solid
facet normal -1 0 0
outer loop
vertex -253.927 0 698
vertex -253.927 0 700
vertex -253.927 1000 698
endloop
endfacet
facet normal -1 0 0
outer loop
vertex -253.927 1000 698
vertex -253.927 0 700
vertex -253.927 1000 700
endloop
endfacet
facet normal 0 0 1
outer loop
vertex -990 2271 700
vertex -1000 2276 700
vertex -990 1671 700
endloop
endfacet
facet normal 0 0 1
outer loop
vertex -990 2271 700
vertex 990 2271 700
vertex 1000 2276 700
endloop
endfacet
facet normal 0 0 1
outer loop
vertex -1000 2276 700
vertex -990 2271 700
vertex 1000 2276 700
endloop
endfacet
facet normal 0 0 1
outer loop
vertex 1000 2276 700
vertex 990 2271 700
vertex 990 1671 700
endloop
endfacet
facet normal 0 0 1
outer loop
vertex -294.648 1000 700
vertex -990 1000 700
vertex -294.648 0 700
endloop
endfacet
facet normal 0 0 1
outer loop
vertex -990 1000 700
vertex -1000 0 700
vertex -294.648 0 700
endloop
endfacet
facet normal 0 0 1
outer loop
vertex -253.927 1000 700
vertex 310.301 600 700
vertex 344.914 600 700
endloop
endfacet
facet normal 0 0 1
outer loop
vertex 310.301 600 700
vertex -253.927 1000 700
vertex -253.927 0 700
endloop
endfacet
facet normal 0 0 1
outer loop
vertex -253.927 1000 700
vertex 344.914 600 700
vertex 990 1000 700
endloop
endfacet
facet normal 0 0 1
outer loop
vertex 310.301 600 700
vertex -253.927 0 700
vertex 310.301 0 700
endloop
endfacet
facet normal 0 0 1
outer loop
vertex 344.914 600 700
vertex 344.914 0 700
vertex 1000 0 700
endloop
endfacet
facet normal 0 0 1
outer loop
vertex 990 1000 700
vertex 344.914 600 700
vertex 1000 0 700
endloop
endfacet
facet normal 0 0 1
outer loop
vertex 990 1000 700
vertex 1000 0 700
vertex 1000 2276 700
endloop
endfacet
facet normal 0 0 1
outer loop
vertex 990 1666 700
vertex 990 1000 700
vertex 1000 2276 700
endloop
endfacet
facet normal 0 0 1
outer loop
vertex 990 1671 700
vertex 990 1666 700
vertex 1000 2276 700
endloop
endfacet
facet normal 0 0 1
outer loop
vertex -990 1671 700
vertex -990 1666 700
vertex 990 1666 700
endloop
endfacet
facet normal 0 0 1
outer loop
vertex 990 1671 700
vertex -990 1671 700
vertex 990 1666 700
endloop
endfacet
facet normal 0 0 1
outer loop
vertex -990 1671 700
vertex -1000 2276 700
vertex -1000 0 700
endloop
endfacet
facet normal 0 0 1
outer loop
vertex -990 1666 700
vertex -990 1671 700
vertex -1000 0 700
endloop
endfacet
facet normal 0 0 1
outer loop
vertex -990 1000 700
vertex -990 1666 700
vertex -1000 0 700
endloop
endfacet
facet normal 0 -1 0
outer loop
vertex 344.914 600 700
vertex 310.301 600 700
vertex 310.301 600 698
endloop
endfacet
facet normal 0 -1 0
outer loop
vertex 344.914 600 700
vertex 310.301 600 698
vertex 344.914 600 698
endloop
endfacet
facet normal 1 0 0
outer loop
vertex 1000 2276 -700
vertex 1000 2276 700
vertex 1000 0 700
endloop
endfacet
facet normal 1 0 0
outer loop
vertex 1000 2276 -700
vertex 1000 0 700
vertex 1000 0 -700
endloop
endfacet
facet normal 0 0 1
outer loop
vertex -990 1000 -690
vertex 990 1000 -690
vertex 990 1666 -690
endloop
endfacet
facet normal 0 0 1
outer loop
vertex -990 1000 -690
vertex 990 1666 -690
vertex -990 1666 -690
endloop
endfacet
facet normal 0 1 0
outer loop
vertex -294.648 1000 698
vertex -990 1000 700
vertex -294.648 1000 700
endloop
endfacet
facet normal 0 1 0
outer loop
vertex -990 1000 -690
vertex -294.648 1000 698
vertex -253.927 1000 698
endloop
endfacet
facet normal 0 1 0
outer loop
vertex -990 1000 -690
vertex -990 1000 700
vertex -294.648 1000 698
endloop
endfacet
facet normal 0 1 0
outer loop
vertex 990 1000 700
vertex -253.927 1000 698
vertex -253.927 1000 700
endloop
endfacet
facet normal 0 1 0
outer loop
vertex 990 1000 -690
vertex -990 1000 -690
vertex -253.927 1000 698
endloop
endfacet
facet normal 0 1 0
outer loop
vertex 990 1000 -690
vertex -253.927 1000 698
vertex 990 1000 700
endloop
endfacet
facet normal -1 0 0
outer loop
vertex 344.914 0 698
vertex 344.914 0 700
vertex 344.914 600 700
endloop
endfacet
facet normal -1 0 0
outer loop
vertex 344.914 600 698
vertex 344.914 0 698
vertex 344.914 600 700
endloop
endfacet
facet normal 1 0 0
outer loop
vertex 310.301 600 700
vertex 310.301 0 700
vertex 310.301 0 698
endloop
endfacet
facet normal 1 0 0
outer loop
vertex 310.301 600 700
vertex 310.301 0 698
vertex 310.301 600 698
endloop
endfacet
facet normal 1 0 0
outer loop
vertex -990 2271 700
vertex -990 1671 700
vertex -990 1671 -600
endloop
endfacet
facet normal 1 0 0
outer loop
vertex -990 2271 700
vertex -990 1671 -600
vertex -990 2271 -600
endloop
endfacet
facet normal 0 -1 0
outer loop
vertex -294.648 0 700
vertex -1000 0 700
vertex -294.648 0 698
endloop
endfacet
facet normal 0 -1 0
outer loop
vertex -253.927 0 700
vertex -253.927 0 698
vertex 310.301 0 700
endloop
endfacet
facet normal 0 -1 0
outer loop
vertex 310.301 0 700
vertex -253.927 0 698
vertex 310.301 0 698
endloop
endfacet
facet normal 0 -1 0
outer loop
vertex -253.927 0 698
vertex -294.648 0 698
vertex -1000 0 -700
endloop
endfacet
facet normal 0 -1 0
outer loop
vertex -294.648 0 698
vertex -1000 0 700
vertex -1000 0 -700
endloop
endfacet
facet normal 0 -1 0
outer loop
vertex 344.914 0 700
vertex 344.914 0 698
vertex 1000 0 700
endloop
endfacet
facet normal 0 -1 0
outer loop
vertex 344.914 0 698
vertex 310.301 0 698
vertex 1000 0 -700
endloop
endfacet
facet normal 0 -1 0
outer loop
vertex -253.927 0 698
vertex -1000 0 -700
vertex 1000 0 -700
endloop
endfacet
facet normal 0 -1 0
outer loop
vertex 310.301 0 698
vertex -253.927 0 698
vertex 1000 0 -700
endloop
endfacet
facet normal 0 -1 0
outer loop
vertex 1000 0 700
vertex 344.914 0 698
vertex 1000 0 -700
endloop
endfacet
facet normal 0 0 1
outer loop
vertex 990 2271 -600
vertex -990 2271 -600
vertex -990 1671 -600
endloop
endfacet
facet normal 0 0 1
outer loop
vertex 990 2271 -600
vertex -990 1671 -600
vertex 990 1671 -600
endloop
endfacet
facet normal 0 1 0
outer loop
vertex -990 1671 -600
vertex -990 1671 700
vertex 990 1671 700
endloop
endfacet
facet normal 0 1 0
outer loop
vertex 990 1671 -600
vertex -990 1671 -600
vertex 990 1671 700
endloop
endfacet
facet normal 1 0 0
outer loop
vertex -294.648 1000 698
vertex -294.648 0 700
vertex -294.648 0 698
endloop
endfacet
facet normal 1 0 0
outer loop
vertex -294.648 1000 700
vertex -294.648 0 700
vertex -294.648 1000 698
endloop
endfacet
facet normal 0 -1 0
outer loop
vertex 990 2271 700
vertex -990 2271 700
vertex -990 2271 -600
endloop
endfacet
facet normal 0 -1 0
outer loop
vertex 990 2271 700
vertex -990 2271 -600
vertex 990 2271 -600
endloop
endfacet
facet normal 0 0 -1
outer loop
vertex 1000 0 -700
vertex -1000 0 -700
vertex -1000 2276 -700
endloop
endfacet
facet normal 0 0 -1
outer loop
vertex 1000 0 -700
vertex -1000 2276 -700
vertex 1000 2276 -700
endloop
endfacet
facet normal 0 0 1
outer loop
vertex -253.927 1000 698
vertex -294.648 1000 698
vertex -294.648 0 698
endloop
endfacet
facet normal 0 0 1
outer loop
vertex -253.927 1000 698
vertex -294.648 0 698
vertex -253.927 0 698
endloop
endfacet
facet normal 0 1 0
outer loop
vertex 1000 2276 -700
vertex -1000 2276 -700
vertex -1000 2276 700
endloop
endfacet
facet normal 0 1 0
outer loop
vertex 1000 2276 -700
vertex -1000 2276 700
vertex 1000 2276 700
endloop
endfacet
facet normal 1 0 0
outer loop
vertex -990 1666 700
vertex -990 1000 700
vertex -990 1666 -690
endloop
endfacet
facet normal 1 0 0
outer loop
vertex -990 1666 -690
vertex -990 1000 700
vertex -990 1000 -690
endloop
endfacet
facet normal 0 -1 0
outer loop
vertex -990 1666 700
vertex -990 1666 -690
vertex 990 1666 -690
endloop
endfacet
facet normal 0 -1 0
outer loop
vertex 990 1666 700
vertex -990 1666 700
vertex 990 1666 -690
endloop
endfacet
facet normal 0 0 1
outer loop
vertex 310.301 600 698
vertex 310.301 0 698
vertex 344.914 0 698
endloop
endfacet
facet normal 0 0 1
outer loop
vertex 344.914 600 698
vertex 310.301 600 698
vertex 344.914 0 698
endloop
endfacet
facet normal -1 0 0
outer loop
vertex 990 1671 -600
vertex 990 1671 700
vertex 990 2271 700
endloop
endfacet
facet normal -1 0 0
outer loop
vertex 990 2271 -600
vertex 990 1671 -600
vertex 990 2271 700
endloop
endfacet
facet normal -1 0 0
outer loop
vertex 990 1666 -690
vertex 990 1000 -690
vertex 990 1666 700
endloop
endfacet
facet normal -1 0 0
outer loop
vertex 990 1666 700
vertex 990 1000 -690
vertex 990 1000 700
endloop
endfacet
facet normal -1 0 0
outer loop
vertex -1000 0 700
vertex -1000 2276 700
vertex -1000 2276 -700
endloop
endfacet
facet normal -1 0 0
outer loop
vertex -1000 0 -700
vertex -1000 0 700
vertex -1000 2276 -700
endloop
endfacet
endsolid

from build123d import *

# Parameters (mm, degrees)
CROQUIS1_W              = 2000
CROQUIS1_H              = 1400
SALIENTE_EXTRUIR1_DEPTH = 1000
CROQUIS2_W              = 40.721486725
CROQUIS2_H              = 1000
CROQUIS2_W_2            = 34.613400616
CROQUIS2_H_2            = 600
CORTAR_EXTRUIR1_DEPTH   = 2
SALIENTE_EXTRUIR2_DEPTH = 666
CROQUIS6_W              = 2000
CROQUIS6_H              = 1400
SALIENTE_EXTRUIR3_DEPTH = 610
CROQUIS7_W              = 1980
CROQUIS7_H              = 600
CORTAR_EXTRUIR4_DEPTH   = 1300


with BuildPart() as part:
    # Croquis1 → Saliente-Extruir1 (new body)
    with BuildSketch(Plane(origin=(0, 0, 0), x_dir=(1, 0, 0), z_dir=(0, 1, 0))):
        Rectangle(CROQUIS1_W, CROQUIS1_H)
    extrude(amount=SALIENTE_EXTRUIR1_DEPTH)

    # Croquis2 → Cortar-Extruir1 (cut)
    with BuildSketch(Plane.XY.offset(700)):
        with Locations((-274.287558023, 500)):
            Rectangle(CROQUIS2_W, CROQUIS2_H)
        with Locations((327.607420408, 300)):
            Rectangle(CROQUIS2_W_2, CROQUIS2_H_2)
    extrude(amount=-CORTAR_EXTRUIR1_DEPTH, mode=Mode.SUBTRACT)

    # Croquis5 → Saliente-Extruir2 (add)
    with BuildSketch(Plane(origin=(0, 1000, 0), x_dir=(1, 0, 0), z_dir=(0, 1, 0))):
        Polygon((1000, -700), (990, -700), (990, -690), (990, 690), (-990, 690), (-990, -690), (-990, -700), (-1000, -700), (-1000, 700), (1000, 700), align=None)
    extrude(amount=SALIENTE_EXTRUIR2_DEPTH)

    # Croquis6 → Saliente-Extruir3 (add)
    with BuildSketch(Plane(origin=(0, 1666, 0), x_dir=(1, 0, 0), z_dir=(0, 1, 0))):
        Rectangle(CROQUIS6_W, CROQUIS6_H)
    extrude(amount=SALIENTE_EXTRUIR3_DEPTH)

    # Croquis7 → Cortar-Extruir4 (cut)
    with BuildSketch(Plane.XY.offset(700)):
        with Locations((0, 1971)):
            Rectangle(CROQUIS7_W, CROQUIS7_H)
    extrude(amount=-CORTAR_EXTRUIR4_DEPTH, mode=Mode.SUBTRACT)


solid = part.part
